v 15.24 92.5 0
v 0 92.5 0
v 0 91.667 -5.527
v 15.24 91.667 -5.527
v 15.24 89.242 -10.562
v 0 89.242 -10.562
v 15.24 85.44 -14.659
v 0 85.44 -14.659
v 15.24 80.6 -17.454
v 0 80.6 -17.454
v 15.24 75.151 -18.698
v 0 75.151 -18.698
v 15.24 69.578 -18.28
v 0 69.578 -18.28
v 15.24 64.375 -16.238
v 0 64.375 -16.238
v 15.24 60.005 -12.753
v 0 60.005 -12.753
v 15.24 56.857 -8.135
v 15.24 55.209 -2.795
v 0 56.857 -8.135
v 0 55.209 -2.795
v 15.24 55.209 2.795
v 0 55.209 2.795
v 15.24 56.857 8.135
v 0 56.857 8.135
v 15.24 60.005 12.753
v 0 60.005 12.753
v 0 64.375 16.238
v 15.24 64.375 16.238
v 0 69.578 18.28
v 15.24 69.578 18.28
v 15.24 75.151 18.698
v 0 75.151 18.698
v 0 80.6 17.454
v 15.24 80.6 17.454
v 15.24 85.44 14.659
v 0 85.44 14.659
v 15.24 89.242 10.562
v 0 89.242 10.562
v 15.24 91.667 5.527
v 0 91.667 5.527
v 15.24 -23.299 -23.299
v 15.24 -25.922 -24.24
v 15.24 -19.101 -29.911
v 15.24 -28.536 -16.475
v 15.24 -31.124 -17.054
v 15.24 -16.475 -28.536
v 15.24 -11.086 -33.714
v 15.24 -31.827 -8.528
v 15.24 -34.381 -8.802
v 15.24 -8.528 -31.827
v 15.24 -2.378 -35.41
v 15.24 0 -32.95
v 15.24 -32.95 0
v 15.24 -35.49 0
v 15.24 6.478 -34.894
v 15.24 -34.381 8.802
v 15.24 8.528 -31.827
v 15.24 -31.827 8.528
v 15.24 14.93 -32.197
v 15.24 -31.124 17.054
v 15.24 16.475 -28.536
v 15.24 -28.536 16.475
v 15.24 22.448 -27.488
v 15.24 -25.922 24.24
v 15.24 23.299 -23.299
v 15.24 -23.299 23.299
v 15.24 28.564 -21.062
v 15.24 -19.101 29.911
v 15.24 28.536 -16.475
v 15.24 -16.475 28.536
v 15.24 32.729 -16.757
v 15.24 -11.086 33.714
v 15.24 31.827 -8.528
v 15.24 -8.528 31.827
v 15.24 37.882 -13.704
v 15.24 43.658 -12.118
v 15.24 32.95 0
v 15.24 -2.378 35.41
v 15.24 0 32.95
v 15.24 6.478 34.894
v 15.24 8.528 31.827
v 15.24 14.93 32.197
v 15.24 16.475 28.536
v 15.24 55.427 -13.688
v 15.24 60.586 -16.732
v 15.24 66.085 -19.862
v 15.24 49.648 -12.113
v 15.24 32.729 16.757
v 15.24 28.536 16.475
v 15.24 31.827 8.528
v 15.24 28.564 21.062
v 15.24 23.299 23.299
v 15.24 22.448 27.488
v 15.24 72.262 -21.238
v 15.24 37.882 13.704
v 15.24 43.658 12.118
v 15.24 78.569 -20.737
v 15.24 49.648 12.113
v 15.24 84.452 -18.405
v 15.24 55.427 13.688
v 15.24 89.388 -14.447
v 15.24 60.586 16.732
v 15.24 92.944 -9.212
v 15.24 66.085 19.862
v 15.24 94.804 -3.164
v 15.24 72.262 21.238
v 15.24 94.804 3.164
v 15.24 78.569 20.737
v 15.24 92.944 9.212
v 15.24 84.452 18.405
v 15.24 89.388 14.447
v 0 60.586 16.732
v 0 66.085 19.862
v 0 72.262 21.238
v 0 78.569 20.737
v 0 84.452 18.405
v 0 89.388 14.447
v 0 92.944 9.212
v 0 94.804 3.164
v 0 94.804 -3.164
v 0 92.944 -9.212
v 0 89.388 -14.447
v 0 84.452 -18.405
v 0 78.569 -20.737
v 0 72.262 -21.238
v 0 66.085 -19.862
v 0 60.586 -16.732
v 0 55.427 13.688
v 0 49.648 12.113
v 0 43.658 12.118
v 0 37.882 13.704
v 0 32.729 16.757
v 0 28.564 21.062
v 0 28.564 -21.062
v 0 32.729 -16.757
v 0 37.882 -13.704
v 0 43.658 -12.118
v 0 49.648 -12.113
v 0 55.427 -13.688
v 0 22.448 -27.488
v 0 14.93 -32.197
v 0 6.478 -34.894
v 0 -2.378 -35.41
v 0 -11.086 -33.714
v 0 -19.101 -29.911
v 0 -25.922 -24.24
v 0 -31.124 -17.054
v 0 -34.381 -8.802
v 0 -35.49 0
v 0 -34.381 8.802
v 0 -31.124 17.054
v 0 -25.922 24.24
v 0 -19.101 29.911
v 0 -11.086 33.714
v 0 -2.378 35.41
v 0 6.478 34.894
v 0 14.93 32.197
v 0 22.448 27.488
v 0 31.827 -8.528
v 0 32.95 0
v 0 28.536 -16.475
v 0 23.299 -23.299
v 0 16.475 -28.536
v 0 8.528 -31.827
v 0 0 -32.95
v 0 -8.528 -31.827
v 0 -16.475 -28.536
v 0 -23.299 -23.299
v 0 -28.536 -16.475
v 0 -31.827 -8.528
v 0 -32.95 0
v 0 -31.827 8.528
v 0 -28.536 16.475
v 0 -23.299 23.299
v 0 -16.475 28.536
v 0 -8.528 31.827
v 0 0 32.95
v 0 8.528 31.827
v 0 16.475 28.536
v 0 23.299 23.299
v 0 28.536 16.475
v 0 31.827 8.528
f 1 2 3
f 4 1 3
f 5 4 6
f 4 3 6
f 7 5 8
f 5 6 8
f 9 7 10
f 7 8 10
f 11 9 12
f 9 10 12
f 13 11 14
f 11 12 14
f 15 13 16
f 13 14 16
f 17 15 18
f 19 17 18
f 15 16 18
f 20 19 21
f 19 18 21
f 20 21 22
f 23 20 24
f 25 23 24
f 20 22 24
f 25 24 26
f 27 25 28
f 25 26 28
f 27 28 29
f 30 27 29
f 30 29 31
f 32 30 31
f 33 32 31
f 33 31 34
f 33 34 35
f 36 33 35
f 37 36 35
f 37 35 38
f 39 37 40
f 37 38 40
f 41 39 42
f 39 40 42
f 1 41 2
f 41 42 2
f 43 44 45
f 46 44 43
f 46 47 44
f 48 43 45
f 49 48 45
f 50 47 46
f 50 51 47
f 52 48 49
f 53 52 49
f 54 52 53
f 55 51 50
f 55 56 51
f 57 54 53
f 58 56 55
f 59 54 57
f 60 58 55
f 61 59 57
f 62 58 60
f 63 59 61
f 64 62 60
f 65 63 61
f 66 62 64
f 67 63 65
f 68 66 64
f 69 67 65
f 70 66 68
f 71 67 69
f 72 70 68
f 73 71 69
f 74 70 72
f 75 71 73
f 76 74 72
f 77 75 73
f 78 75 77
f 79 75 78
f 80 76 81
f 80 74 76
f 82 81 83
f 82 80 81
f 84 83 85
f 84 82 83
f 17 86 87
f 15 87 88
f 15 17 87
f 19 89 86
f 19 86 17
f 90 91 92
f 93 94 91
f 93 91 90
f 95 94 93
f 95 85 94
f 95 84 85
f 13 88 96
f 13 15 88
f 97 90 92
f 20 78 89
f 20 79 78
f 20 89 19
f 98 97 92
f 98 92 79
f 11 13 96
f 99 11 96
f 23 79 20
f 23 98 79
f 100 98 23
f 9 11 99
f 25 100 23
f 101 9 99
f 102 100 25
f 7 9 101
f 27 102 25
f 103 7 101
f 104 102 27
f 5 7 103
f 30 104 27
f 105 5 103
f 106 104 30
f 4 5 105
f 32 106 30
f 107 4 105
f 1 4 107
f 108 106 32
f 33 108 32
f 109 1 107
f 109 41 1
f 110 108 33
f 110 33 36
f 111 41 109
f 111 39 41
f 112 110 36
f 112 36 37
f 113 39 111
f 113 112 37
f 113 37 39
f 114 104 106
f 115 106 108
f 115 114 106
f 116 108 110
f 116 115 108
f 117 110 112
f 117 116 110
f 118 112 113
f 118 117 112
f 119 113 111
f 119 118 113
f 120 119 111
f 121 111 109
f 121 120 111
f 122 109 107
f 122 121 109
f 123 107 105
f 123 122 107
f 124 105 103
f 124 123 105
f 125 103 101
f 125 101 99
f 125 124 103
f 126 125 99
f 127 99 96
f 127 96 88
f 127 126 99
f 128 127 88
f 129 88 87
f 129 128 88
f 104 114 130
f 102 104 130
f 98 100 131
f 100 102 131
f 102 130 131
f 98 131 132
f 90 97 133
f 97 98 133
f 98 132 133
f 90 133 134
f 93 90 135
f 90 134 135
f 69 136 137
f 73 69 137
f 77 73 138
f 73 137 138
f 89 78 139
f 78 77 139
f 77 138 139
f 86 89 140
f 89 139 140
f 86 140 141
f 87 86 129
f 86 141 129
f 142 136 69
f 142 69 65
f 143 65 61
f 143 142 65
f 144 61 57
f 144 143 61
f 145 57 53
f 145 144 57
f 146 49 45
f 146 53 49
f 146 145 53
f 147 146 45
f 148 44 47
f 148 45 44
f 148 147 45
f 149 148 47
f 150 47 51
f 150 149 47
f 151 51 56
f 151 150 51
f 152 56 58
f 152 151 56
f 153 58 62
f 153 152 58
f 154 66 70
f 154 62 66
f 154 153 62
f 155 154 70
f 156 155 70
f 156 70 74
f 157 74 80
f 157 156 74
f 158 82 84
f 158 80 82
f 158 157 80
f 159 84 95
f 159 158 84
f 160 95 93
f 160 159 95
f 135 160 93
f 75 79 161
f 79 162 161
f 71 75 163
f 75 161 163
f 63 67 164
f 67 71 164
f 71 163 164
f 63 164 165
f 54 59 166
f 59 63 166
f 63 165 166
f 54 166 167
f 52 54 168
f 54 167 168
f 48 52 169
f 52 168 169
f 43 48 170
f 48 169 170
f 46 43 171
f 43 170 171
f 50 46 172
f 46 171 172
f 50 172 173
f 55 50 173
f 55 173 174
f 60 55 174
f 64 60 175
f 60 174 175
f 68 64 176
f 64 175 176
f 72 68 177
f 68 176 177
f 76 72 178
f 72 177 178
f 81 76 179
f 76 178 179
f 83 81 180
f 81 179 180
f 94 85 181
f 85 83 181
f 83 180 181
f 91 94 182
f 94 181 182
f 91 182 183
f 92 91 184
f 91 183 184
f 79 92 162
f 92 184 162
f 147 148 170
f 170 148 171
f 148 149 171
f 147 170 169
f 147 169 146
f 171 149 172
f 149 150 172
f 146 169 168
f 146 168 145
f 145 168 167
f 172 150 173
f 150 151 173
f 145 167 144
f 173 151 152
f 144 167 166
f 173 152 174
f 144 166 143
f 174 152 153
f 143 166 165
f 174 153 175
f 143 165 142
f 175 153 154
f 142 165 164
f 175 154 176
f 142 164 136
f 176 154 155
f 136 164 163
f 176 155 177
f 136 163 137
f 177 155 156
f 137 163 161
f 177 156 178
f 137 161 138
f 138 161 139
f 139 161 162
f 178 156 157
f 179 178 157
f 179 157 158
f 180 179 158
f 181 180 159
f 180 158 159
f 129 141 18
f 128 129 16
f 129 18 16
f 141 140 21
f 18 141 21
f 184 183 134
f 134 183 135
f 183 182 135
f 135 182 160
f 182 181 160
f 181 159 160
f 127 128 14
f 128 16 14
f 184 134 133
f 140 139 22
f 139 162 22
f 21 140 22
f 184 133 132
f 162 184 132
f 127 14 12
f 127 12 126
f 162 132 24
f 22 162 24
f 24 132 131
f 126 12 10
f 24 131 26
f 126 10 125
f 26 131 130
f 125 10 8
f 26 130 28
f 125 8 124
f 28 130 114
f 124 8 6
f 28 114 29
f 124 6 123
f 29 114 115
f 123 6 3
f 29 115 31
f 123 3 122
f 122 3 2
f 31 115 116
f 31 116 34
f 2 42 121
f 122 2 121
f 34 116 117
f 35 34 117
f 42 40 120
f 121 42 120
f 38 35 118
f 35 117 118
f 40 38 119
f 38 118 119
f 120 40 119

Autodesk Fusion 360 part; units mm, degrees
sketch "Sketch2" plane through (0, 0, 0) normal (1, 0, 0) x (0, 1, 0)
  circle A0 centre (73.75, 0) radius 21.29
  line L0 (0, 0) -> (147.5, 0) construction
  circle A1 centre (73.75, 0) radius 18.75
  line L1 (78.83, -20.32) -> (78.83, -17.78)
  circle A2 centre (0, 0) radius 35.49
  line L2 (35.49, 0) -> (52.46, 0)
  circle A3 centre (46.6735, 34.4155) radius 22.5
  circle A4 centre (46.6735, -34.4155) radius 22.5
  circle A5 centre (0, 0) radius 32.95
  dimension "d11" = 37.5
  dimension "d14" = 2.54
  dimension "d24" = 65.9
  dimension "d25" = 2.54
  dimension "d26" = 73.75
  dimension "d27" = 45
extrude "Extrude2" add sketch "Sketch2" along normal blind 15.24 contours A0 | A0 A2 L2 A3 | A0 A2 L2 A4 | A2
